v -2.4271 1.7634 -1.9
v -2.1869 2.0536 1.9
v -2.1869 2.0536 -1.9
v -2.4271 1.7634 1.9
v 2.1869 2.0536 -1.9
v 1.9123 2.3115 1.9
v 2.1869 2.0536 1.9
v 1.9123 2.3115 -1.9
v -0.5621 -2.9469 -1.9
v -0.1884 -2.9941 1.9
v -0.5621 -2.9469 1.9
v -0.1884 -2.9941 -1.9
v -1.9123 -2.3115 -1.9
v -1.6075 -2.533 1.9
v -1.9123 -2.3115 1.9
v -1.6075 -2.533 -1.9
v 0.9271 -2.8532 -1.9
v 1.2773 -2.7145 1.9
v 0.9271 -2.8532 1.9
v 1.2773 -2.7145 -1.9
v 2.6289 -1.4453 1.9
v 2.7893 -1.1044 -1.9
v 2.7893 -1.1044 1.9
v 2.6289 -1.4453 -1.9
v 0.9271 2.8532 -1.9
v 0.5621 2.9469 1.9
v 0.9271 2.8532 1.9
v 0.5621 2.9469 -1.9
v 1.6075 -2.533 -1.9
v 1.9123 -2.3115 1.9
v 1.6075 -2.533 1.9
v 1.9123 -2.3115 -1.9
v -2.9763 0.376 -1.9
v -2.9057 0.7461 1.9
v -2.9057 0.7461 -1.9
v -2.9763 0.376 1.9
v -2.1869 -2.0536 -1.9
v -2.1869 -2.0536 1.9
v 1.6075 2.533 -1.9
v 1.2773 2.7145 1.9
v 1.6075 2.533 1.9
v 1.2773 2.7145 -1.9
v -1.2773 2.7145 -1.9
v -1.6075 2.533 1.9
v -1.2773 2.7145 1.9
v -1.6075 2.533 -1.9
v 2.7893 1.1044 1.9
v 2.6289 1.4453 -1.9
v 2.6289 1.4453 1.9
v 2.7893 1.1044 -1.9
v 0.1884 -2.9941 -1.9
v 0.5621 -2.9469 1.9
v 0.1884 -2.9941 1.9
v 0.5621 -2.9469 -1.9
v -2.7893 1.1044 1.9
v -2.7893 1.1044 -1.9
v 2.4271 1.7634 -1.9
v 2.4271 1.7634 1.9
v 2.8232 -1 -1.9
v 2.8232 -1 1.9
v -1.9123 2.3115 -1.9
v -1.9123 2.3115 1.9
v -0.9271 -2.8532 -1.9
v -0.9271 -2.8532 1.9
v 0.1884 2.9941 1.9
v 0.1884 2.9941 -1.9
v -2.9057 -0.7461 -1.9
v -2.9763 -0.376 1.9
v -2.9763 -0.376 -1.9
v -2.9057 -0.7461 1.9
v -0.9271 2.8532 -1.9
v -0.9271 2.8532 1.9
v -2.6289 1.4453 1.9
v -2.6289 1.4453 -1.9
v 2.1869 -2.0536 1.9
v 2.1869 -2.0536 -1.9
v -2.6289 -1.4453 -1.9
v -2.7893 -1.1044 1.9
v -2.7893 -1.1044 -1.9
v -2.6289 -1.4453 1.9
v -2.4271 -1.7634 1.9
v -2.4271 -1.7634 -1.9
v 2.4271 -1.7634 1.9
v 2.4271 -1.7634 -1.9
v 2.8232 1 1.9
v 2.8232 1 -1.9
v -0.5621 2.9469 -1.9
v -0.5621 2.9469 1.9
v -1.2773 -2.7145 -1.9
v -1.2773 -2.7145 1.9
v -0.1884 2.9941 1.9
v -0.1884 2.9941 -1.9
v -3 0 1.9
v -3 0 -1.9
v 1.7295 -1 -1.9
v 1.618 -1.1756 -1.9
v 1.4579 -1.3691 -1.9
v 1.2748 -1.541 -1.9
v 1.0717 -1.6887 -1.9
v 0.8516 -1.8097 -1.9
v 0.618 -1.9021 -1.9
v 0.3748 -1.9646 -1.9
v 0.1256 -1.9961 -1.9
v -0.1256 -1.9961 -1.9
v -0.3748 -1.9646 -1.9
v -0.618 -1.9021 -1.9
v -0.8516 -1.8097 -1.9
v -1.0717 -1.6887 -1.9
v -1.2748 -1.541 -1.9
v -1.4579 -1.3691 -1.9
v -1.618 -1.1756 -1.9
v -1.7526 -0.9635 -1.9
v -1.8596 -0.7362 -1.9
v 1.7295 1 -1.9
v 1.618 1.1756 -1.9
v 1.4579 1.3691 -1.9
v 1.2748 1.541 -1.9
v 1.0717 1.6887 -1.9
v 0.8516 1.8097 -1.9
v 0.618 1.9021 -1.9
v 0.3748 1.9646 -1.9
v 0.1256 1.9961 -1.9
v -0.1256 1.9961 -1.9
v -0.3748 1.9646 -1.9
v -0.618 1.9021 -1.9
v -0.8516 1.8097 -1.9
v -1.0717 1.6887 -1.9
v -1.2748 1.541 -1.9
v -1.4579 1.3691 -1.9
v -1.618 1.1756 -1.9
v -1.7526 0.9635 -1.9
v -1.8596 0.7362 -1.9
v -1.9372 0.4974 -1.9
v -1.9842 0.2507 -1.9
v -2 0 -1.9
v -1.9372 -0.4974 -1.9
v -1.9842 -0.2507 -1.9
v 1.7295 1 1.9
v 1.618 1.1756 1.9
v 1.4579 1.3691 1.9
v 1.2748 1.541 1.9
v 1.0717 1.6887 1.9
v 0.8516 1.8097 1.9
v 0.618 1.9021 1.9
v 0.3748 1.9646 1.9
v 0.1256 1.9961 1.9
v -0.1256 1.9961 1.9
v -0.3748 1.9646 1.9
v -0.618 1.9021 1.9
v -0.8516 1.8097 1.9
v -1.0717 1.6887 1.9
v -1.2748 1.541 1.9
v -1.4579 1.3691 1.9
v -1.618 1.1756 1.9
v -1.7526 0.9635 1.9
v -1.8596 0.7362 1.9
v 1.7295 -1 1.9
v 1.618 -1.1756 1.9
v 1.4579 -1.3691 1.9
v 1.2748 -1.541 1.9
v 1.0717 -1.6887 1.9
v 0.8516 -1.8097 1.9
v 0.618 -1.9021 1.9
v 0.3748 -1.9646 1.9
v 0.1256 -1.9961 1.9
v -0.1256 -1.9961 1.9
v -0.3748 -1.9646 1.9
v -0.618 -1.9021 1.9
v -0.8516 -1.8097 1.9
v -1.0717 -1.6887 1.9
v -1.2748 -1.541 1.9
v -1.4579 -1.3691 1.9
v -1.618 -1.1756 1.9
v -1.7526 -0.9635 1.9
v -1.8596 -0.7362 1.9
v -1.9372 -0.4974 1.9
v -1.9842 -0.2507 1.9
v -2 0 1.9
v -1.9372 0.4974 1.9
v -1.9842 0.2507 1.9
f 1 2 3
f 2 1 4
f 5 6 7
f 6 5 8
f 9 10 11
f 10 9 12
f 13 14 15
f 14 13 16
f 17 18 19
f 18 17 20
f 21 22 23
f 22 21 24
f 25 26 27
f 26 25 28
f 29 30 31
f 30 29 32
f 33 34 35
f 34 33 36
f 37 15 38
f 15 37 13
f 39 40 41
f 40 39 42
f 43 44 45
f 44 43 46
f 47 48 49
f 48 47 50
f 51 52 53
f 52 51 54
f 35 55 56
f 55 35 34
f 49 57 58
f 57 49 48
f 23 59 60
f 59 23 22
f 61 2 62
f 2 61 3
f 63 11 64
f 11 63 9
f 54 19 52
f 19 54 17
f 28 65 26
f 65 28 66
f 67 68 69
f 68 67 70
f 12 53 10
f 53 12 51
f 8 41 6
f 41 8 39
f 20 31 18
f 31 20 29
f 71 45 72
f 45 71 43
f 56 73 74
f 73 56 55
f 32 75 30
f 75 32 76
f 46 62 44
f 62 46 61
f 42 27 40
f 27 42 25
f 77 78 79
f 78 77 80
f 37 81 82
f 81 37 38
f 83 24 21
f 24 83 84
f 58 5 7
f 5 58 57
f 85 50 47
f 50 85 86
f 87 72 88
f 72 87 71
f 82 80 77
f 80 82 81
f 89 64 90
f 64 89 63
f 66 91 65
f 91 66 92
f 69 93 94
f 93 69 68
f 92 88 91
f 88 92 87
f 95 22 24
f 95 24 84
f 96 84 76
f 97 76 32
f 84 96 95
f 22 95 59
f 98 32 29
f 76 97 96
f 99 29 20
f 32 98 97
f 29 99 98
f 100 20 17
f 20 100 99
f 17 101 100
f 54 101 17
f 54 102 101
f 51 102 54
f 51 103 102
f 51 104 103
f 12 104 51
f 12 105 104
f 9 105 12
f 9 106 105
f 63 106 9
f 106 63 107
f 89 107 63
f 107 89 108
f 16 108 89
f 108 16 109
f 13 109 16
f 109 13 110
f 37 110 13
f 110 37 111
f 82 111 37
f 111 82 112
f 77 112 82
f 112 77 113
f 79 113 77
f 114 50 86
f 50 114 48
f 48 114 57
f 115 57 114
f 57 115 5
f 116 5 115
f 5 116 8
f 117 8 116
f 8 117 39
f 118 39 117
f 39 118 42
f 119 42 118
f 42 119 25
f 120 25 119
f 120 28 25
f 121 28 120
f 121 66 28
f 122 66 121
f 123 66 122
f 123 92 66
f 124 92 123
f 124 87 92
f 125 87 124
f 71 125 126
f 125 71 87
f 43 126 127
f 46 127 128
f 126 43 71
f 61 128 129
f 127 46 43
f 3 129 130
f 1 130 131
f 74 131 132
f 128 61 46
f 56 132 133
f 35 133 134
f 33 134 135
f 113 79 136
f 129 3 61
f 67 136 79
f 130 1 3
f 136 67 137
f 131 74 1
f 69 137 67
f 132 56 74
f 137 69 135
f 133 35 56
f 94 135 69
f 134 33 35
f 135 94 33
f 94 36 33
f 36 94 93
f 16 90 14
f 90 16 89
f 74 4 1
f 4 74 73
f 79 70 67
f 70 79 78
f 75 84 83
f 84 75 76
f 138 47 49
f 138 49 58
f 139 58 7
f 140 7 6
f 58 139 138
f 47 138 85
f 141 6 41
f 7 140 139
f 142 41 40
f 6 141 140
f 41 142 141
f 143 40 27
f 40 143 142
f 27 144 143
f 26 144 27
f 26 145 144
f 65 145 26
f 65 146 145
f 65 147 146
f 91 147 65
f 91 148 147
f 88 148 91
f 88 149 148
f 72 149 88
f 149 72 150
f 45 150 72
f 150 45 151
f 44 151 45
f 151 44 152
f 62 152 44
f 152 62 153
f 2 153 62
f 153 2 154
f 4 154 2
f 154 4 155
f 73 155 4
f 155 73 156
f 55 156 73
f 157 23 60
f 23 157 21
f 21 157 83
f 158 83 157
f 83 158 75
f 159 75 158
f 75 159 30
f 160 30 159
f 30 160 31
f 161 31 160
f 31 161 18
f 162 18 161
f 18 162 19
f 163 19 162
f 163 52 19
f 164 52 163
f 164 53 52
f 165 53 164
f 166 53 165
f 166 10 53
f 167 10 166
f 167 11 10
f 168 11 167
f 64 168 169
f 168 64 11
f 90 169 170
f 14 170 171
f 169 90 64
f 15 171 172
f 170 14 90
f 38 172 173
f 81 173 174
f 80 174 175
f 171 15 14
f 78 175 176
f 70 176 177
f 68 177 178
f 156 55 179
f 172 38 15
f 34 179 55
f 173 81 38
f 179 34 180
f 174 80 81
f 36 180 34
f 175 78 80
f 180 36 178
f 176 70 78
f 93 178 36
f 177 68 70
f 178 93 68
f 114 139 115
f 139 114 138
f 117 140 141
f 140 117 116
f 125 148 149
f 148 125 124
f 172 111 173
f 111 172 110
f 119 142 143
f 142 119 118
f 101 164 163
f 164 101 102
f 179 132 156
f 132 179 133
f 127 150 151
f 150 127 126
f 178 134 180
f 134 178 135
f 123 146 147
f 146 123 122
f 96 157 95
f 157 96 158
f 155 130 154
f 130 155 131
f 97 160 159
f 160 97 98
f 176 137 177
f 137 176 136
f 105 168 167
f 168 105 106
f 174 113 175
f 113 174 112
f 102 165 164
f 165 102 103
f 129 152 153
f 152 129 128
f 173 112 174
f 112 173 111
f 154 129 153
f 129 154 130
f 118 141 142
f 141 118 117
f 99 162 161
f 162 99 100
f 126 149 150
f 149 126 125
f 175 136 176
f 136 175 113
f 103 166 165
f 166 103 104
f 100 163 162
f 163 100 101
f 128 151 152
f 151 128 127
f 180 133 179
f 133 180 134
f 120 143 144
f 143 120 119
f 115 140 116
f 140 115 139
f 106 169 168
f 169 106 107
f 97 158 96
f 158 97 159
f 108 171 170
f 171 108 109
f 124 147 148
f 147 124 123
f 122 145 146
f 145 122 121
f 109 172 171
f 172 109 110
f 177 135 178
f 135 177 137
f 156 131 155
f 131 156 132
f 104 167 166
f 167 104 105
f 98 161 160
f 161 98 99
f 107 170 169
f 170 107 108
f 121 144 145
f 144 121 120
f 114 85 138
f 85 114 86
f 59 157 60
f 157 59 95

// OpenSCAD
// A substitute for nylon rings for Low-Pro Edge style tremolo arms


$fn = 50;
innerDiameter = 4;
outerDiameter = 6;
height = 3.8; // make it a bit lower to fit easily
cutout = 2;

difference () {
    difference () {
        cylinder(h = height, r1 = outerDiameter / 2, r2 = outerDiameter / 2, center = true);
        cylinder(h = height *2, r1 = innerDiameter / 2, r2 = innerDiameter / 2, center = true);
    }
    translate ([outerDiameter / 2,0,0])
    cube([outerDiameter, cutout, height * 2], center=true);
}
